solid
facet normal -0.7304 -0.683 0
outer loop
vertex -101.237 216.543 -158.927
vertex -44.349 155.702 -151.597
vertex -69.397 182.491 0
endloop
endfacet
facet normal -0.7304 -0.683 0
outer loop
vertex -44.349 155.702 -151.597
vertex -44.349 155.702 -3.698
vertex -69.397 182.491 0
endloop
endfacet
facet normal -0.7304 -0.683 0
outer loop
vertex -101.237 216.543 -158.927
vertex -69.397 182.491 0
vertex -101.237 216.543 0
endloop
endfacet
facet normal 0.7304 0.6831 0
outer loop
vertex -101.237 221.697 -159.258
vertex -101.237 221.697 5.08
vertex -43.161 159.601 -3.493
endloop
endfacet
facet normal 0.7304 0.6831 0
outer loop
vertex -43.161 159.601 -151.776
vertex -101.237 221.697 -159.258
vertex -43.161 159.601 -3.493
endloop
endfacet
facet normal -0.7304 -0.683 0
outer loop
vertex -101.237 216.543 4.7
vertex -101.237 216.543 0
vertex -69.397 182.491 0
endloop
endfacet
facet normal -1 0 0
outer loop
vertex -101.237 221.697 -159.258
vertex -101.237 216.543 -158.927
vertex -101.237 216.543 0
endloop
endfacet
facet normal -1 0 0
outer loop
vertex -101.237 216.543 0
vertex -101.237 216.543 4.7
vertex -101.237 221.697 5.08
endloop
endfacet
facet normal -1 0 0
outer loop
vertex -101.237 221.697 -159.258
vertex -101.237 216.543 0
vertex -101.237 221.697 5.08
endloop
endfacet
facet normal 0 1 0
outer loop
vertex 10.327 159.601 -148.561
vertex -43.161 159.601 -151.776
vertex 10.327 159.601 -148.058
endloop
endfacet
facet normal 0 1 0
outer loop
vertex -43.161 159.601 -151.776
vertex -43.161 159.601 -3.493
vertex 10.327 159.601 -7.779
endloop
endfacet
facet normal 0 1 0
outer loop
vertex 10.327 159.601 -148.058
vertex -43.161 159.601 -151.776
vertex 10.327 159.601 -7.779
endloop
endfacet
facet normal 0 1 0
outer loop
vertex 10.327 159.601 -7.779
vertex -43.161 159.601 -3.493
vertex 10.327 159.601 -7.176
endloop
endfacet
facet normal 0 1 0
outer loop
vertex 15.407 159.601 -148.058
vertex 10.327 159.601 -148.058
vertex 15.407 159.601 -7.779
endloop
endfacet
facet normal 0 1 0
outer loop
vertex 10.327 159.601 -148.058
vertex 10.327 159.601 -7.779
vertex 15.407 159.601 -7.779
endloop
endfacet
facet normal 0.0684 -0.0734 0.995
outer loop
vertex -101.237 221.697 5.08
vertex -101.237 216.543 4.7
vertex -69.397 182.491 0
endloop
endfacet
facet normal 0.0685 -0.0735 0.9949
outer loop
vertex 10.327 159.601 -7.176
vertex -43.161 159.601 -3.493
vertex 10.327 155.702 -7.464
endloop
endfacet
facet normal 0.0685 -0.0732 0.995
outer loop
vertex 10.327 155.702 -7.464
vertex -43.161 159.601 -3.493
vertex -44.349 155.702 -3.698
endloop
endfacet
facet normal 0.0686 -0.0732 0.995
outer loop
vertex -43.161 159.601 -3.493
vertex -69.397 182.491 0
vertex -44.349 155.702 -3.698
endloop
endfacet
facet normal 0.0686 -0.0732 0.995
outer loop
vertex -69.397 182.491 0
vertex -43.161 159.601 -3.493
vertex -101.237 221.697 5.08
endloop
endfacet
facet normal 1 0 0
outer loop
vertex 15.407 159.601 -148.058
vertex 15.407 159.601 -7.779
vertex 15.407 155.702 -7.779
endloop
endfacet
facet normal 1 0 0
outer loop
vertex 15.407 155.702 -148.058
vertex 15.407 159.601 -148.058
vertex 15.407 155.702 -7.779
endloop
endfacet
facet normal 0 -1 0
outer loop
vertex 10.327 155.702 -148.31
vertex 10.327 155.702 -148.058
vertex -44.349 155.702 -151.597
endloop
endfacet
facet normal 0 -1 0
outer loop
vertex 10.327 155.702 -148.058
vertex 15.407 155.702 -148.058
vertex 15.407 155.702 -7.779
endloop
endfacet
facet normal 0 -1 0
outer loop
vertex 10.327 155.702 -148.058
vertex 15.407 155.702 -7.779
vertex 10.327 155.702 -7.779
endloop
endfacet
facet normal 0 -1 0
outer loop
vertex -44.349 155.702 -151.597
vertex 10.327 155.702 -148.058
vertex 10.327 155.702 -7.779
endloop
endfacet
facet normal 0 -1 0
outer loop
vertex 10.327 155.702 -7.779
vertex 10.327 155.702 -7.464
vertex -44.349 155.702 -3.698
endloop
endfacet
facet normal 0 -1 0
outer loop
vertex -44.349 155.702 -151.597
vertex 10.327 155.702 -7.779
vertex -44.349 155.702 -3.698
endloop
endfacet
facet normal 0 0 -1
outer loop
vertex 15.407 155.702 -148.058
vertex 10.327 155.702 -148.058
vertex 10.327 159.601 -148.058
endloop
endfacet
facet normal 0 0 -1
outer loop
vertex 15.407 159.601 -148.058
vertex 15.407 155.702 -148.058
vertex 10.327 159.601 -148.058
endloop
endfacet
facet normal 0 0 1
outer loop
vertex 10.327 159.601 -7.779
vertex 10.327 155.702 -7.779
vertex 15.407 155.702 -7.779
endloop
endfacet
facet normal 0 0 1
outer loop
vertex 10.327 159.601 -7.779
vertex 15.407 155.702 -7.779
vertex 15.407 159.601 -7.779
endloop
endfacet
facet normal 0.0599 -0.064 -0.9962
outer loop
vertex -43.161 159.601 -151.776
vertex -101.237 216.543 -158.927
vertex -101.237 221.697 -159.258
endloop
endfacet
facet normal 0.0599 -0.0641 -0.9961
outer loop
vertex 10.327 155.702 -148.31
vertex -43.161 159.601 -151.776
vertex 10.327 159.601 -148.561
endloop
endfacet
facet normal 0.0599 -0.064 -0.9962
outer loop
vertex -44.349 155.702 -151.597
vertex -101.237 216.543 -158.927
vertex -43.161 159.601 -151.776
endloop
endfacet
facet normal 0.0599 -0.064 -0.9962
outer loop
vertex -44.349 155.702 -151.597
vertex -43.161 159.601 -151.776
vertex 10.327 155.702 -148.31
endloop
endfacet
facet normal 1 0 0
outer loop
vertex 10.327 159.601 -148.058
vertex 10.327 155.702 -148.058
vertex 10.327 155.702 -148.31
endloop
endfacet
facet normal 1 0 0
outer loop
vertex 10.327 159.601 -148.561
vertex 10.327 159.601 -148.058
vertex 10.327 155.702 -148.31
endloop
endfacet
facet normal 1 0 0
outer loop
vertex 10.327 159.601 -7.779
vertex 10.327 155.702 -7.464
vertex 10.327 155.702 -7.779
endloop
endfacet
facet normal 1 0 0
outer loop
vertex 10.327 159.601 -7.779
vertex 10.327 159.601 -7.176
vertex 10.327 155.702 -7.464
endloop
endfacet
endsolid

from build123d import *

# Parameters (mm, degrees)
BOSS_EXTRUDE1_DEPTH     = 5.08
CUT_EXTRUDE1_DEPTH      = 50.8
SKETCH3_W               = 34.377834067
SKETCH3_H               = 141.590062345
CUT_EXTRUDE2_DEPTH      = 25.4
SKETCH4_R               = 1.4224
CUT_EXTRUDE3_DEPTH      = 5.08
BOSS_EXTRUDE2_DEPTH     = 164.338
CUT_EXTRUDE4_DEPTH      = 152.4
CUT_EXTRUDE5_DEPTH      = 152.4
CUT_EXTRUDE5_DEPTH_BACK = 152.4
SKETCH8_W               = 19.066411764
SKETCH8_H               = 17.374579431
SKETCH8_W_2             = 17.073824451
CUT_EXTRUDE6_DEPTH      = 5.08


with BuildPart() as part:
    # Sketch1 → Boss-Extrude1 (new body)
    with BuildSketch(Plane.XY):
        Polygon((0, 0), (0, 216.543480298), (-101.237370502, 216.543480298), (-101.237370502, 120.65), align=None)
    extrude(amount=BOSS_EXTRUDE1_DEPTH)

    # Sketch2 → Cut-Extrude1 (cut)
    with BuildSketch(Plane.XY.offset(5.08)):
        Polygon((-101.237370502, 216.543480298), (0, 108.271740149), (0, 216.543480298), align=None)
    extrude(amount=-CUT_EXTRUDE1_DEPTH, mode=Mode.SUBTRACT)

    # Sketch3 → Cut-Extrude2 (cut)
    with BuildSketch(Plane.XY.offset(5.08)):
        with Locations((5.61014441, 62.39317364)):
            Rectangle(SKETCH3_W, SKETCH3_H)
    extrude(amount=-CUT_EXTRUDE2_DEPTH, mode=Mode.SUBTRACT)

    # Sketch4 → Cut-Extrude3 (cut)
    with BuildSketch(Plane(origin=(0, 0, 0), x_dir=(0, 0, 1), z_dir=(-0.7660444431189743, -0.6427876096865437, 0))):
        with Locations((2.54, 26.412934343)):
            Circle(SKETCH4_R)
        with Locations((2.54, 153.412934343)):
            Circle(SKETCH4_R)
    extrude(amount=-CUT_EXTRUDE3_DEPTH, mode=Mode.SUBTRACT)

    # Sketch5 → Boss-Extrude2 (add)
    with BuildSketch(Plane.XY.offset(5.08)):
        Polygon((-101.237370502, 216.543480298), (-101.237370502, 221.697031777), (-43.160539618, 159.601331401), (15.407326332, 159.601331401), (15.407326332, 155.702260244), (-44.348979053, 155.702260244), align=None)
    extrude(amount=-BOSS_EXTRUDE2_DEPTH)

    # Sketch6 → Cut-Extrude4 (cut)
    with BuildSketch(Plane(origin=(0, 0, -63.5), x_dir=(-1, 0, 0), z_dir=(0, 0, -1))):
        Polygon((11.578772624, 120.655051318), (11.578772624, 13.799043873), (101.237370502, 120.65), (101.237370502, 216.543480298), align=None)
    extrude(amount=-CUT_EXTRUDE4_DEPTH, mode=Mode.SUBTRACT)

    # Sketch7 → Cut-Extrude5 (cut, two sides: drawn at the far end of the back side and taken through both)
    with BuildSketch(Plane(origin=(56.600313361, 52.937108481, 0), x_dir=(0, 0, -1), z_dir=(0.7303459019409237, 0.6830774945188128, 0)).offset(-CUT_EXTRUDE5_DEPTH_BACK)):
        Polygon((-5.08, 231.068488025), (7.526341611, 106.039780465), (-5.08, 106.039780465), align=None)
        Polygon((159.258, 231.068488025), (148.255408438, 106.039780465), (159.258, 106.039780465), align=None)
    extrude(amount=CUT_EXTRUDE5_DEPTH + CUT_EXTRUDE5_DEPTH_BACK, mode=Mode.SUBTRACT)

    # Sketch8 → Cut-Extrude6 (cut)
    with BuildSketch(Plane(origin=(15.407326332, 0, 0), x_dir=(0, 0, -1), z_dir=(1, 0, 0))):
        with Locations((-1.754260648, 156.68928868)):
            Rectangle(SKETCH8_W, SKETCH8_H)
        with Locations((156.594427777, 156.68928868)):
            Rectangle(SKETCH8_W_2, SKETCH8_H)
    extrude(amount=-CUT_EXTRUDE6_DEPTH, mode=Mode.SUBTRACT)


solid = part.part
